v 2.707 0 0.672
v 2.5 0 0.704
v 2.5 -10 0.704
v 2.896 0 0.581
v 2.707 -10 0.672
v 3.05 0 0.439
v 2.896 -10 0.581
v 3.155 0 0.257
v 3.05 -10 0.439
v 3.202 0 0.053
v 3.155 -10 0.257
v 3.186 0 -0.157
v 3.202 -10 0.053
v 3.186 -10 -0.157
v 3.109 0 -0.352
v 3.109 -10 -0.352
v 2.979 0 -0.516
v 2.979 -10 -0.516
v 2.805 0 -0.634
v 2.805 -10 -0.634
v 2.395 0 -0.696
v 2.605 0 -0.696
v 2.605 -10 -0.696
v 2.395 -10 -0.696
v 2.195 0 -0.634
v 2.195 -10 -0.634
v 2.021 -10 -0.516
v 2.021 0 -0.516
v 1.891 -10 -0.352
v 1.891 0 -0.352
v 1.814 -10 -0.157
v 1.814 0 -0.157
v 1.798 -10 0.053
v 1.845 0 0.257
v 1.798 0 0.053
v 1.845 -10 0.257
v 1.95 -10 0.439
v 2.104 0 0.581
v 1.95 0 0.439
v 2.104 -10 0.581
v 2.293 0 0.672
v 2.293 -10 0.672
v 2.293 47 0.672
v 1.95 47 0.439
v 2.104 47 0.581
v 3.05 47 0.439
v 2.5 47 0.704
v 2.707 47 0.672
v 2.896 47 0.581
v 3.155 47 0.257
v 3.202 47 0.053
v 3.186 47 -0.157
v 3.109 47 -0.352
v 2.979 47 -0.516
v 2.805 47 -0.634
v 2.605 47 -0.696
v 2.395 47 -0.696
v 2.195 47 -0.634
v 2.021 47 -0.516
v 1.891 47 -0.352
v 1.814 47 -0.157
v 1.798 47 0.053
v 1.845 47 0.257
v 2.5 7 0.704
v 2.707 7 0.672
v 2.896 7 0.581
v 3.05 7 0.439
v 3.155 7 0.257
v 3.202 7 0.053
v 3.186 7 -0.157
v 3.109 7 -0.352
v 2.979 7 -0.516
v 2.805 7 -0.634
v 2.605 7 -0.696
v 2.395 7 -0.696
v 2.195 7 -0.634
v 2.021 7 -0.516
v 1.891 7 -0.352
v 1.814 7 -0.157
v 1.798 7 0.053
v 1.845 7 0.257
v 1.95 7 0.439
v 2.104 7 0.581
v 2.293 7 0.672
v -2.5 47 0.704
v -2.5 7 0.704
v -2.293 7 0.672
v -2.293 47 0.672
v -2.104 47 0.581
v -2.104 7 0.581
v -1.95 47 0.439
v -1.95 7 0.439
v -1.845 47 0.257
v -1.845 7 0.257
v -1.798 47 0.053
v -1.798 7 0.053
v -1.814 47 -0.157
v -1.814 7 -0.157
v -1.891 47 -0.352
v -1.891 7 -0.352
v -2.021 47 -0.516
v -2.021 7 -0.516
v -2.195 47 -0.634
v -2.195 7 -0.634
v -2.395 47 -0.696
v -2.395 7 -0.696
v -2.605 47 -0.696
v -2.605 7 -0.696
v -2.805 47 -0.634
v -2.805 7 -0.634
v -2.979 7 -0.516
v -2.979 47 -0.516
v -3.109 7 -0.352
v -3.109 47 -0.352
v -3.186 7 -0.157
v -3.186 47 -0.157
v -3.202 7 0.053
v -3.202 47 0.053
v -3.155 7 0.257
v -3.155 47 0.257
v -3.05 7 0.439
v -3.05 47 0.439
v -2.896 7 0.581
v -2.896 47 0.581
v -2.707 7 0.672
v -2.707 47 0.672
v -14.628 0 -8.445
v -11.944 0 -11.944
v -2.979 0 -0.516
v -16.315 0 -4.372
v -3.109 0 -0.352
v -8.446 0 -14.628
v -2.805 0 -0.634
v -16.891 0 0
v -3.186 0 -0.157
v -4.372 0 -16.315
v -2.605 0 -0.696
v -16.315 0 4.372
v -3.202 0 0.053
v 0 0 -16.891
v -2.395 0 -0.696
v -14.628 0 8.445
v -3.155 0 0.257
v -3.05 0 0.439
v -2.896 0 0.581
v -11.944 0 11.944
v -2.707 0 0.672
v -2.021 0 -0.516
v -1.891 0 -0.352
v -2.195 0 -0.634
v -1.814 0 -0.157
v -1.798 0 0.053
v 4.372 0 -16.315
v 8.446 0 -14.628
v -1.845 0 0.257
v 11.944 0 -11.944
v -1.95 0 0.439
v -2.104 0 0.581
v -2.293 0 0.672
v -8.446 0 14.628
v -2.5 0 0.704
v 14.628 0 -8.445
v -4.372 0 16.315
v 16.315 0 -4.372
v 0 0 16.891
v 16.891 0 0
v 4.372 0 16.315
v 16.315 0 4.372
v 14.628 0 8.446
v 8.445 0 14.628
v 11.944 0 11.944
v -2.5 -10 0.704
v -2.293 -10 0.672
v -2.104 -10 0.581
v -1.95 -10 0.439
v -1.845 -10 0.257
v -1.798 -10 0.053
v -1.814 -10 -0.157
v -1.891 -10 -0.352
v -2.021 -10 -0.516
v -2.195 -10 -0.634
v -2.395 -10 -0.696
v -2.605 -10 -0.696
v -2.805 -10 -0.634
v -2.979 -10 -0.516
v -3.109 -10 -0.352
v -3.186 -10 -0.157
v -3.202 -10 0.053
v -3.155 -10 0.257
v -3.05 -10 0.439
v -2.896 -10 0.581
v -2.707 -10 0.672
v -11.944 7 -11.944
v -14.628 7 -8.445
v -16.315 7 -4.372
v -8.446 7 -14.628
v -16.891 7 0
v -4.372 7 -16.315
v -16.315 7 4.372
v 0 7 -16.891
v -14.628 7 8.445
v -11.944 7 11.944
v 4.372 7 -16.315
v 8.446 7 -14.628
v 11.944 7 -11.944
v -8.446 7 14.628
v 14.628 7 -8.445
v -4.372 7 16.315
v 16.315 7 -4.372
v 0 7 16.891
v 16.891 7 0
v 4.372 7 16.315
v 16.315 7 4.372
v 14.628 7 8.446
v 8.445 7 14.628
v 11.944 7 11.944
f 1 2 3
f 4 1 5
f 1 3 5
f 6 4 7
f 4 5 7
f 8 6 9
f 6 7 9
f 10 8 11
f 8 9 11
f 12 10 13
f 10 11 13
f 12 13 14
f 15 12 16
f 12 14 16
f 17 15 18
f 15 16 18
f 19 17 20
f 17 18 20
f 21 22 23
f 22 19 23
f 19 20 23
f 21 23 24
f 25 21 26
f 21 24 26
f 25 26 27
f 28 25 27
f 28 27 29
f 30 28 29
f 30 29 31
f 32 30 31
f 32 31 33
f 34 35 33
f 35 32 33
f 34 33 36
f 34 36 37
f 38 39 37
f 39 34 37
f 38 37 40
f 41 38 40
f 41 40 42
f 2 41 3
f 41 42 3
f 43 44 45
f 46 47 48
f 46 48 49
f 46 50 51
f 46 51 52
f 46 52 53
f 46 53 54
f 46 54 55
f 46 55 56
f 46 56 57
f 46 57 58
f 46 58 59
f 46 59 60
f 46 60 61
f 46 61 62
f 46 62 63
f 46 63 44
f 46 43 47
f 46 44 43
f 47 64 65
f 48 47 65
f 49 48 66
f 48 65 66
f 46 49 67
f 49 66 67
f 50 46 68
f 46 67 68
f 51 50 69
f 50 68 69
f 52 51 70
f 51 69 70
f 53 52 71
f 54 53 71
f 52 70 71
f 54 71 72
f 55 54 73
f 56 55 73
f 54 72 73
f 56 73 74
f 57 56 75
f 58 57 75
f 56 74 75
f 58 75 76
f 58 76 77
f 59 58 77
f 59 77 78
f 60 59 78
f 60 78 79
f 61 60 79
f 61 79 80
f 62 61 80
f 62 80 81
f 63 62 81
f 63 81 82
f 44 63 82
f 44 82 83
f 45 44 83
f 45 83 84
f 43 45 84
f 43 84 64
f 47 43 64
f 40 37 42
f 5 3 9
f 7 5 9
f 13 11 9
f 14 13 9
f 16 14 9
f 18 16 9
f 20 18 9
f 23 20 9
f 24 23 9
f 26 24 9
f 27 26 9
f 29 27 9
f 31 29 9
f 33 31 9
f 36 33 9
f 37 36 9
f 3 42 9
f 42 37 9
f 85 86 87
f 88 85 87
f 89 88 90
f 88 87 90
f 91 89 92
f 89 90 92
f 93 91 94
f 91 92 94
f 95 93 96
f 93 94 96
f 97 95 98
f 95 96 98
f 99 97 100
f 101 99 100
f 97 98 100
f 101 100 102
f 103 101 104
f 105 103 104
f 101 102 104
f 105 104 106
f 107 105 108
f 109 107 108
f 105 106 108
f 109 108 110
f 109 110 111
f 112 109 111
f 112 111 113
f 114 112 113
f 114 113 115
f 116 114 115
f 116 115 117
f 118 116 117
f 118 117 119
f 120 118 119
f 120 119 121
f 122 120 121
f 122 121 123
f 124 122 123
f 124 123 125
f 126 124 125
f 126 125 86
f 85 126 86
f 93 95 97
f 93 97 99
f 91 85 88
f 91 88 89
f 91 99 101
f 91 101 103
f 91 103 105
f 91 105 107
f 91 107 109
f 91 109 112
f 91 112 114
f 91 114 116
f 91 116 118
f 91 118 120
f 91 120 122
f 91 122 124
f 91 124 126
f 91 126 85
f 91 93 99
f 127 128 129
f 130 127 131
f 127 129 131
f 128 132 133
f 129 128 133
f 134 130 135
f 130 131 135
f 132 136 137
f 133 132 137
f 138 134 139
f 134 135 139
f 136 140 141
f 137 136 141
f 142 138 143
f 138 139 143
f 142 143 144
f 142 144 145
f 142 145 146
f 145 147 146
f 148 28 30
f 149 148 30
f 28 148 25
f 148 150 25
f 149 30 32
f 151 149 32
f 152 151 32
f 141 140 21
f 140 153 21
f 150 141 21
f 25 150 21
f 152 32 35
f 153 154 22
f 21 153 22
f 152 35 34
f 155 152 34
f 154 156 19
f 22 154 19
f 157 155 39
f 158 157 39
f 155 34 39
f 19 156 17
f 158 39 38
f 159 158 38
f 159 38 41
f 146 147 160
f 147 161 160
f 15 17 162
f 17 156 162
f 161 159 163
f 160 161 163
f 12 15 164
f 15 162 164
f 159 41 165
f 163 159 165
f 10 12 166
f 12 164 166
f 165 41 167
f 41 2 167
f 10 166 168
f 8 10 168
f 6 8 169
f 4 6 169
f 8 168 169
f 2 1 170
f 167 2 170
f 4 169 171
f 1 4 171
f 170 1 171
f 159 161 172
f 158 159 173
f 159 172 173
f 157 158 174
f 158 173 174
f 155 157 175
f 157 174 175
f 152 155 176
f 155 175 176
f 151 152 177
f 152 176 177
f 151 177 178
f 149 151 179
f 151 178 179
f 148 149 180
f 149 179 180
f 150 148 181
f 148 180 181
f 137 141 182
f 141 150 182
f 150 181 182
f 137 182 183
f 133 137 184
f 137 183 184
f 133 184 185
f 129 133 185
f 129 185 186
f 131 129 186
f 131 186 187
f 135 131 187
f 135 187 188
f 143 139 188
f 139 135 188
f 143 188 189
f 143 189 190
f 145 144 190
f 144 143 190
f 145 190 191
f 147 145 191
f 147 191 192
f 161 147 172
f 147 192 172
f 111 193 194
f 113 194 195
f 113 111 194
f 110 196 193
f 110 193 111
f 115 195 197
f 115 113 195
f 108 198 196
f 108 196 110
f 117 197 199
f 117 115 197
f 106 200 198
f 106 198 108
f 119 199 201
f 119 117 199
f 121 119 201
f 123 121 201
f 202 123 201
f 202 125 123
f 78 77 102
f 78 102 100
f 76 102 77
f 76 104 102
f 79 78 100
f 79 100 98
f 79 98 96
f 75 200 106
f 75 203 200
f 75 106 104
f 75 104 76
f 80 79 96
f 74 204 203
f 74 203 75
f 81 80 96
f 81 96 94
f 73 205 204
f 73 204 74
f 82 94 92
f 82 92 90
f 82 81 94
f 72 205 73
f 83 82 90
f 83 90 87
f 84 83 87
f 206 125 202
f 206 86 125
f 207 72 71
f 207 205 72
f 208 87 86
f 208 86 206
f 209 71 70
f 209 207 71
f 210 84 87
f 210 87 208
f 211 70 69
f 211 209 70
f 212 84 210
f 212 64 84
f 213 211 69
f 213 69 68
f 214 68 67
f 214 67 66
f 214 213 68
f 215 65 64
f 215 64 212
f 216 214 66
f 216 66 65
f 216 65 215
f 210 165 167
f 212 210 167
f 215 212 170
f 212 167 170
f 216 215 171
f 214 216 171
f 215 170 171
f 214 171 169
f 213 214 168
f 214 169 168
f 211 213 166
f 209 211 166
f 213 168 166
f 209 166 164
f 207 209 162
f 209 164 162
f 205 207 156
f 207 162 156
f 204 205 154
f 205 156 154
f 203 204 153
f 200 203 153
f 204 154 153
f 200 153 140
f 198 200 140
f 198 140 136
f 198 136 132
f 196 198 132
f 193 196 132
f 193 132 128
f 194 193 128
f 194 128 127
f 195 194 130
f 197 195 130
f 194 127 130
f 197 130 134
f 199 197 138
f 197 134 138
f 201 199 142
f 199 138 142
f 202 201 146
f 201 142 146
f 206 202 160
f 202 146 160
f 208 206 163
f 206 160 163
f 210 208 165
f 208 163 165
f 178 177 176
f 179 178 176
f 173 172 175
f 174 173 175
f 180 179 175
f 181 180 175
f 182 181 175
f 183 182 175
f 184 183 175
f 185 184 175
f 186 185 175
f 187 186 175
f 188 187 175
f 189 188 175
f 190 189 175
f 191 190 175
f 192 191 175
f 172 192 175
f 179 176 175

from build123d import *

# Parameters (mm, degrees)
SKETCH2_R                = 16.891
BOSS_EXTRUDE1_DEPTH      = 7
BOSS_EXTRUDE2_DEPTH      = 40
BOSS_EXTRUDE2_DEPTH_BACK = 17
SKETCH3_R                = 0.703637869


with BuildPart() as part:
    # Sketch2 → Boss-Extrude1 (new body)
    with BuildSketch(Plane(origin=(0, 0, 0), x_dir=(1, 0, 0), z_dir=(0, 1, 0))):
        with Locations(Location((0, 0, 0), (0, 0, 270))):
            Circle(SKETCH2_R)
    extrude(amount=BOSS_EXTRUDE1_DEPTH)

    # Sketch3 → Boss-Extrude2 (add, two sides: drawn at the far end of the back side and taken through both)
    with BuildSketch(Plane(origin=(0, 7, 0), x_dir=(1, 0, 0), z_dir=(0, 1, 0)).offset(-BOSS_EXTRUDE2_DEPTH_BACK)):
        with Locations(Location((-2.5, 0, 0), (0, 0, 270))):
            Circle(SKETCH3_R)
        with Locations(Location((2.5, 0, 0), (0, 0, 270))):
            Circle(SKETCH3_R)
    extrude(amount=BOSS_EXTRUDE2_DEPTH + BOSS_EXTRUDE2_DEPTH_BACK)


solid = part.part
